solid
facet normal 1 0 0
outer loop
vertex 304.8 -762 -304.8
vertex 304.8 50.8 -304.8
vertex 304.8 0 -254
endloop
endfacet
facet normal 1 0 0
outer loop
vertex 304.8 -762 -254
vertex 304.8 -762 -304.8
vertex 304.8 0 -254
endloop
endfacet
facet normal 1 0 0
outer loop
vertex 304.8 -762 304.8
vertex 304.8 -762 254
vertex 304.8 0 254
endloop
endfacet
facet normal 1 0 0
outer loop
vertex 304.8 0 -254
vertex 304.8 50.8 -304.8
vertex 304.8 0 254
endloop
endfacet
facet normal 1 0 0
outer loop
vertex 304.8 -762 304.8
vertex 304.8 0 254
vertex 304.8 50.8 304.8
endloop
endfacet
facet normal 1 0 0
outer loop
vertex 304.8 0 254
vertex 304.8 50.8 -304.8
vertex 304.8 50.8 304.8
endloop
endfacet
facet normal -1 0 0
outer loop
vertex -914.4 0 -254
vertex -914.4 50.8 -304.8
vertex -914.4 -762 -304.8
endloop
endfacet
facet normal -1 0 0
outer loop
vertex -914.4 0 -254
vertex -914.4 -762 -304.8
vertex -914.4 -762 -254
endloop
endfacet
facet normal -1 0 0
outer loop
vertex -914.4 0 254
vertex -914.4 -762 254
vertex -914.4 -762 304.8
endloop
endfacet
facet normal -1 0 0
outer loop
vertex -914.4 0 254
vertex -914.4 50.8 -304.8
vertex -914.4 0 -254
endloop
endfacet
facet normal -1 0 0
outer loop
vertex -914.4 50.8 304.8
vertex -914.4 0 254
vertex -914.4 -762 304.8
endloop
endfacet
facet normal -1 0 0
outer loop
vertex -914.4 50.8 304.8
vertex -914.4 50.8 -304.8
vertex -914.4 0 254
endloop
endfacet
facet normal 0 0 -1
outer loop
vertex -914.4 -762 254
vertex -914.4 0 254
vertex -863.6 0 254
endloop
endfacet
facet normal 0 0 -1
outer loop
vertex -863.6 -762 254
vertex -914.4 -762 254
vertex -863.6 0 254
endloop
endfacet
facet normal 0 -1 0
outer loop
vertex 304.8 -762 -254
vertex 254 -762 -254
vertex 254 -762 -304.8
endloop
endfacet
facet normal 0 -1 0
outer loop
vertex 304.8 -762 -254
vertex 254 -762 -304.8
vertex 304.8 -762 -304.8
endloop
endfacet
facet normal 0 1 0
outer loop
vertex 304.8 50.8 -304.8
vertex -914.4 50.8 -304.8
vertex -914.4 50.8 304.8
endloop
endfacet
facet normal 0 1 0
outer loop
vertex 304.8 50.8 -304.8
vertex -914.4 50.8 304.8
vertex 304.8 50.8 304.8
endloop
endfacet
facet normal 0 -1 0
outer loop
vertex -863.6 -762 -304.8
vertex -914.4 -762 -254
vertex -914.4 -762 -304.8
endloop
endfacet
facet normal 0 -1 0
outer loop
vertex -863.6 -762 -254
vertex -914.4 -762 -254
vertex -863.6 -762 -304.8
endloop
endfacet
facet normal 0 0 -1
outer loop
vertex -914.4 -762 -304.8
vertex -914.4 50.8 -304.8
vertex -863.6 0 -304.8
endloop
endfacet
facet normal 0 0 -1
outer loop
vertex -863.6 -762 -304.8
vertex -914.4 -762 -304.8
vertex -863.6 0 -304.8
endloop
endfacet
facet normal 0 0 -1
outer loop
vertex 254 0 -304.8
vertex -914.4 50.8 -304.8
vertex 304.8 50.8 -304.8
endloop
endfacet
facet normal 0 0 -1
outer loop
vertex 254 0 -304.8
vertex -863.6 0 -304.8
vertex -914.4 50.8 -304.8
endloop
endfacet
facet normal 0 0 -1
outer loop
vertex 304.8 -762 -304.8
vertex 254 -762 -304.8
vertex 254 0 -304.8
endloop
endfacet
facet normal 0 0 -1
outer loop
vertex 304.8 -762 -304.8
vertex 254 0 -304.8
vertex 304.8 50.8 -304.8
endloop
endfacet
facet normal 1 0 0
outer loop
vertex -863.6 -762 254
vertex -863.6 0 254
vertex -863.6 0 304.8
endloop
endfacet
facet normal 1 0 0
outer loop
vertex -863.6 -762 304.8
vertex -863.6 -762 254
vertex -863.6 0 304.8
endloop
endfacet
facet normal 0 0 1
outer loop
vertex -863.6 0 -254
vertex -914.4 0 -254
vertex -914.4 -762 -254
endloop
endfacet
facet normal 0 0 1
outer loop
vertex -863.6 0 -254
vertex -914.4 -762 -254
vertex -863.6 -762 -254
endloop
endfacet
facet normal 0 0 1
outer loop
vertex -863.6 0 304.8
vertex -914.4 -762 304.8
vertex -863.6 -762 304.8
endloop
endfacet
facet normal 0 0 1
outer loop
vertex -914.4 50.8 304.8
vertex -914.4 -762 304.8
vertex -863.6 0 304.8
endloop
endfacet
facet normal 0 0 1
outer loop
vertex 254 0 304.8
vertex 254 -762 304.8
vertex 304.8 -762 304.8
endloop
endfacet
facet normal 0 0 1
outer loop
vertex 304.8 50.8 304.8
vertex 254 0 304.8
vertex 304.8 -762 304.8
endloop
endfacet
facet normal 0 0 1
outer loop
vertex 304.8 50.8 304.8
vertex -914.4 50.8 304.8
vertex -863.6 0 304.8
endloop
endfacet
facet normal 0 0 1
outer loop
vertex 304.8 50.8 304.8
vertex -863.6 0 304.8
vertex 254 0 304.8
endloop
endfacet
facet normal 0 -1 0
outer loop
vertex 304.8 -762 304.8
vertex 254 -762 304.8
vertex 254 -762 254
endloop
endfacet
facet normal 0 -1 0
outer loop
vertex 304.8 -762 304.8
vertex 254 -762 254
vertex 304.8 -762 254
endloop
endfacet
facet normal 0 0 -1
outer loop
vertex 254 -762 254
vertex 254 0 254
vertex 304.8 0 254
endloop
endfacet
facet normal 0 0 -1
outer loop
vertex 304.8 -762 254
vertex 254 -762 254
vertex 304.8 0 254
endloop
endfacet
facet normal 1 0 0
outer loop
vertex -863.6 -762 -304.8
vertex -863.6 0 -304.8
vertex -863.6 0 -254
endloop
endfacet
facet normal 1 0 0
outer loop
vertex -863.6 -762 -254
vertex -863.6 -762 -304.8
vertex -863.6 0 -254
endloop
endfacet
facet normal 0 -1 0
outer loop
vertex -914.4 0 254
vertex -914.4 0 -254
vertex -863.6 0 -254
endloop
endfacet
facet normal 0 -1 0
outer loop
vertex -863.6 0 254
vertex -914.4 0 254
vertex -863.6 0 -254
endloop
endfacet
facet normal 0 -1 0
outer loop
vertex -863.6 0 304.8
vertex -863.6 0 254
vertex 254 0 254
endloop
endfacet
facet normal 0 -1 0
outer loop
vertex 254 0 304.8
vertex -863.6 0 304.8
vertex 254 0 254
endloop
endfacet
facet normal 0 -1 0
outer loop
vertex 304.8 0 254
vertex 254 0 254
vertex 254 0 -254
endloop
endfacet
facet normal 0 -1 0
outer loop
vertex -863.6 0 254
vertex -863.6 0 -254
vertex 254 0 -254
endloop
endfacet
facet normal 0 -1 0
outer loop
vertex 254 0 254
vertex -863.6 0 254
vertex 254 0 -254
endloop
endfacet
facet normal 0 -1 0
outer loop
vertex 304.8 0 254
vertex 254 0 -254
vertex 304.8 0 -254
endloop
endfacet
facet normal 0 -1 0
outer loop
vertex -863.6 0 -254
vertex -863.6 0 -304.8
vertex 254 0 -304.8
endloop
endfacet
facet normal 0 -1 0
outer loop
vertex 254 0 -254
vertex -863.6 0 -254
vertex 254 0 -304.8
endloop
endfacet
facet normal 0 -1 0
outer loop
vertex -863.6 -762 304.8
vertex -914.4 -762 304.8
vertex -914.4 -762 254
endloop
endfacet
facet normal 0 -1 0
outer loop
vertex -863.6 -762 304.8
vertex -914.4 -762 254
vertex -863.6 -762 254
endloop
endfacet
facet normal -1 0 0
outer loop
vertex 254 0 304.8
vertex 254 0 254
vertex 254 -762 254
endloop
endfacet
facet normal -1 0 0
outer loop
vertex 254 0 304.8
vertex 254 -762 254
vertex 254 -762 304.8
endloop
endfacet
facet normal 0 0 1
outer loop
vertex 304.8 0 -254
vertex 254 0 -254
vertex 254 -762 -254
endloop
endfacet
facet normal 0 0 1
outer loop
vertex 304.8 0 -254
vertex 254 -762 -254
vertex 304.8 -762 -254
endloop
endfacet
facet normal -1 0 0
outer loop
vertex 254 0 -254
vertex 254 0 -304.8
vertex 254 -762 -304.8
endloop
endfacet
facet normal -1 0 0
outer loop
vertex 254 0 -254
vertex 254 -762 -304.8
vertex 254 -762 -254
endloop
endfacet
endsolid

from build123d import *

# Parameters (mm, degrees)
SKETCH1_W           = 1828.8
SKETCH1_H           = 609.6
BOSS_EXTRUDE1_DEPTH = 50.8
SKETCH2_W           = 50.8
SKETCH2_H           = 50.8
BOSS_EXTRUDE2_DEPTH = 762
SKETCH3_W           = 609.6
SKETCH3_H           = 812.8
CUT_EXTRUDE1_DEPTH  = 1338.304572639
SKETCH4_W           = 50.8
SKETCH4_H           = 50.8
BOSS_EXTRUDE3_DEPTH = 762


with BuildPart() as part:
    # Sketch1 → Boss-Extrude1 (new body)
    with BuildSketch(Plane(origin=(0, 0, 0), x_dir=(1, 0, 0), z_dir=(0, 1, 0))):
        Rectangle(SKETCH1_W, SKETCH1_H)
    extrude(amount=BOSS_EXTRUDE1_DEPTH)

    # Sketch2 → Boss-Extrude2 (add)
    with BuildSketch(Plane.XZ):
        with Locations((-889, 279.4)):
            Rectangle(SKETCH2_W, SKETCH2_H)
        with Locations((-889, -279.4)):
            Rectangle(SKETCH2_W, SKETCH2_H)
        with Locations((889, 279.4)):
            Rectangle(SKETCH2_W, SKETCH2_H)
        with Locations((889, -279.4)):
            Rectangle(SKETCH2_W, SKETCH2_H)
    extrude(amount=BOSS_EXTRUDE2_DEPTH)

    # Sketch3 → Cut-Extrude1 (cut, through all)
    with BuildSketch(Plane.XY.offset(304.8)):
        with Locations((609.6, -355.6)):
            Rectangle(SKETCH3_W, SKETCH3_H)
    extrude(amount=-CUT_EXTRUDE1_DEPTH, mode=Mode.SUBTRACT)

    # Sketch4 → Boss-Extrude3 (add)
    with BuildSketch(Plane.XZ):
        with Locations((279.4, 279.4)):
            Rectangle(SKETCH4_W, SKETCH4_H)
        with Locations((279.4, -279.4)):
            Rectangle(SKETCH4_W, SKETCH4_H)
    extrude(amount=BOSS_EXTRUDE3_DEPTH)


solid = part.part
